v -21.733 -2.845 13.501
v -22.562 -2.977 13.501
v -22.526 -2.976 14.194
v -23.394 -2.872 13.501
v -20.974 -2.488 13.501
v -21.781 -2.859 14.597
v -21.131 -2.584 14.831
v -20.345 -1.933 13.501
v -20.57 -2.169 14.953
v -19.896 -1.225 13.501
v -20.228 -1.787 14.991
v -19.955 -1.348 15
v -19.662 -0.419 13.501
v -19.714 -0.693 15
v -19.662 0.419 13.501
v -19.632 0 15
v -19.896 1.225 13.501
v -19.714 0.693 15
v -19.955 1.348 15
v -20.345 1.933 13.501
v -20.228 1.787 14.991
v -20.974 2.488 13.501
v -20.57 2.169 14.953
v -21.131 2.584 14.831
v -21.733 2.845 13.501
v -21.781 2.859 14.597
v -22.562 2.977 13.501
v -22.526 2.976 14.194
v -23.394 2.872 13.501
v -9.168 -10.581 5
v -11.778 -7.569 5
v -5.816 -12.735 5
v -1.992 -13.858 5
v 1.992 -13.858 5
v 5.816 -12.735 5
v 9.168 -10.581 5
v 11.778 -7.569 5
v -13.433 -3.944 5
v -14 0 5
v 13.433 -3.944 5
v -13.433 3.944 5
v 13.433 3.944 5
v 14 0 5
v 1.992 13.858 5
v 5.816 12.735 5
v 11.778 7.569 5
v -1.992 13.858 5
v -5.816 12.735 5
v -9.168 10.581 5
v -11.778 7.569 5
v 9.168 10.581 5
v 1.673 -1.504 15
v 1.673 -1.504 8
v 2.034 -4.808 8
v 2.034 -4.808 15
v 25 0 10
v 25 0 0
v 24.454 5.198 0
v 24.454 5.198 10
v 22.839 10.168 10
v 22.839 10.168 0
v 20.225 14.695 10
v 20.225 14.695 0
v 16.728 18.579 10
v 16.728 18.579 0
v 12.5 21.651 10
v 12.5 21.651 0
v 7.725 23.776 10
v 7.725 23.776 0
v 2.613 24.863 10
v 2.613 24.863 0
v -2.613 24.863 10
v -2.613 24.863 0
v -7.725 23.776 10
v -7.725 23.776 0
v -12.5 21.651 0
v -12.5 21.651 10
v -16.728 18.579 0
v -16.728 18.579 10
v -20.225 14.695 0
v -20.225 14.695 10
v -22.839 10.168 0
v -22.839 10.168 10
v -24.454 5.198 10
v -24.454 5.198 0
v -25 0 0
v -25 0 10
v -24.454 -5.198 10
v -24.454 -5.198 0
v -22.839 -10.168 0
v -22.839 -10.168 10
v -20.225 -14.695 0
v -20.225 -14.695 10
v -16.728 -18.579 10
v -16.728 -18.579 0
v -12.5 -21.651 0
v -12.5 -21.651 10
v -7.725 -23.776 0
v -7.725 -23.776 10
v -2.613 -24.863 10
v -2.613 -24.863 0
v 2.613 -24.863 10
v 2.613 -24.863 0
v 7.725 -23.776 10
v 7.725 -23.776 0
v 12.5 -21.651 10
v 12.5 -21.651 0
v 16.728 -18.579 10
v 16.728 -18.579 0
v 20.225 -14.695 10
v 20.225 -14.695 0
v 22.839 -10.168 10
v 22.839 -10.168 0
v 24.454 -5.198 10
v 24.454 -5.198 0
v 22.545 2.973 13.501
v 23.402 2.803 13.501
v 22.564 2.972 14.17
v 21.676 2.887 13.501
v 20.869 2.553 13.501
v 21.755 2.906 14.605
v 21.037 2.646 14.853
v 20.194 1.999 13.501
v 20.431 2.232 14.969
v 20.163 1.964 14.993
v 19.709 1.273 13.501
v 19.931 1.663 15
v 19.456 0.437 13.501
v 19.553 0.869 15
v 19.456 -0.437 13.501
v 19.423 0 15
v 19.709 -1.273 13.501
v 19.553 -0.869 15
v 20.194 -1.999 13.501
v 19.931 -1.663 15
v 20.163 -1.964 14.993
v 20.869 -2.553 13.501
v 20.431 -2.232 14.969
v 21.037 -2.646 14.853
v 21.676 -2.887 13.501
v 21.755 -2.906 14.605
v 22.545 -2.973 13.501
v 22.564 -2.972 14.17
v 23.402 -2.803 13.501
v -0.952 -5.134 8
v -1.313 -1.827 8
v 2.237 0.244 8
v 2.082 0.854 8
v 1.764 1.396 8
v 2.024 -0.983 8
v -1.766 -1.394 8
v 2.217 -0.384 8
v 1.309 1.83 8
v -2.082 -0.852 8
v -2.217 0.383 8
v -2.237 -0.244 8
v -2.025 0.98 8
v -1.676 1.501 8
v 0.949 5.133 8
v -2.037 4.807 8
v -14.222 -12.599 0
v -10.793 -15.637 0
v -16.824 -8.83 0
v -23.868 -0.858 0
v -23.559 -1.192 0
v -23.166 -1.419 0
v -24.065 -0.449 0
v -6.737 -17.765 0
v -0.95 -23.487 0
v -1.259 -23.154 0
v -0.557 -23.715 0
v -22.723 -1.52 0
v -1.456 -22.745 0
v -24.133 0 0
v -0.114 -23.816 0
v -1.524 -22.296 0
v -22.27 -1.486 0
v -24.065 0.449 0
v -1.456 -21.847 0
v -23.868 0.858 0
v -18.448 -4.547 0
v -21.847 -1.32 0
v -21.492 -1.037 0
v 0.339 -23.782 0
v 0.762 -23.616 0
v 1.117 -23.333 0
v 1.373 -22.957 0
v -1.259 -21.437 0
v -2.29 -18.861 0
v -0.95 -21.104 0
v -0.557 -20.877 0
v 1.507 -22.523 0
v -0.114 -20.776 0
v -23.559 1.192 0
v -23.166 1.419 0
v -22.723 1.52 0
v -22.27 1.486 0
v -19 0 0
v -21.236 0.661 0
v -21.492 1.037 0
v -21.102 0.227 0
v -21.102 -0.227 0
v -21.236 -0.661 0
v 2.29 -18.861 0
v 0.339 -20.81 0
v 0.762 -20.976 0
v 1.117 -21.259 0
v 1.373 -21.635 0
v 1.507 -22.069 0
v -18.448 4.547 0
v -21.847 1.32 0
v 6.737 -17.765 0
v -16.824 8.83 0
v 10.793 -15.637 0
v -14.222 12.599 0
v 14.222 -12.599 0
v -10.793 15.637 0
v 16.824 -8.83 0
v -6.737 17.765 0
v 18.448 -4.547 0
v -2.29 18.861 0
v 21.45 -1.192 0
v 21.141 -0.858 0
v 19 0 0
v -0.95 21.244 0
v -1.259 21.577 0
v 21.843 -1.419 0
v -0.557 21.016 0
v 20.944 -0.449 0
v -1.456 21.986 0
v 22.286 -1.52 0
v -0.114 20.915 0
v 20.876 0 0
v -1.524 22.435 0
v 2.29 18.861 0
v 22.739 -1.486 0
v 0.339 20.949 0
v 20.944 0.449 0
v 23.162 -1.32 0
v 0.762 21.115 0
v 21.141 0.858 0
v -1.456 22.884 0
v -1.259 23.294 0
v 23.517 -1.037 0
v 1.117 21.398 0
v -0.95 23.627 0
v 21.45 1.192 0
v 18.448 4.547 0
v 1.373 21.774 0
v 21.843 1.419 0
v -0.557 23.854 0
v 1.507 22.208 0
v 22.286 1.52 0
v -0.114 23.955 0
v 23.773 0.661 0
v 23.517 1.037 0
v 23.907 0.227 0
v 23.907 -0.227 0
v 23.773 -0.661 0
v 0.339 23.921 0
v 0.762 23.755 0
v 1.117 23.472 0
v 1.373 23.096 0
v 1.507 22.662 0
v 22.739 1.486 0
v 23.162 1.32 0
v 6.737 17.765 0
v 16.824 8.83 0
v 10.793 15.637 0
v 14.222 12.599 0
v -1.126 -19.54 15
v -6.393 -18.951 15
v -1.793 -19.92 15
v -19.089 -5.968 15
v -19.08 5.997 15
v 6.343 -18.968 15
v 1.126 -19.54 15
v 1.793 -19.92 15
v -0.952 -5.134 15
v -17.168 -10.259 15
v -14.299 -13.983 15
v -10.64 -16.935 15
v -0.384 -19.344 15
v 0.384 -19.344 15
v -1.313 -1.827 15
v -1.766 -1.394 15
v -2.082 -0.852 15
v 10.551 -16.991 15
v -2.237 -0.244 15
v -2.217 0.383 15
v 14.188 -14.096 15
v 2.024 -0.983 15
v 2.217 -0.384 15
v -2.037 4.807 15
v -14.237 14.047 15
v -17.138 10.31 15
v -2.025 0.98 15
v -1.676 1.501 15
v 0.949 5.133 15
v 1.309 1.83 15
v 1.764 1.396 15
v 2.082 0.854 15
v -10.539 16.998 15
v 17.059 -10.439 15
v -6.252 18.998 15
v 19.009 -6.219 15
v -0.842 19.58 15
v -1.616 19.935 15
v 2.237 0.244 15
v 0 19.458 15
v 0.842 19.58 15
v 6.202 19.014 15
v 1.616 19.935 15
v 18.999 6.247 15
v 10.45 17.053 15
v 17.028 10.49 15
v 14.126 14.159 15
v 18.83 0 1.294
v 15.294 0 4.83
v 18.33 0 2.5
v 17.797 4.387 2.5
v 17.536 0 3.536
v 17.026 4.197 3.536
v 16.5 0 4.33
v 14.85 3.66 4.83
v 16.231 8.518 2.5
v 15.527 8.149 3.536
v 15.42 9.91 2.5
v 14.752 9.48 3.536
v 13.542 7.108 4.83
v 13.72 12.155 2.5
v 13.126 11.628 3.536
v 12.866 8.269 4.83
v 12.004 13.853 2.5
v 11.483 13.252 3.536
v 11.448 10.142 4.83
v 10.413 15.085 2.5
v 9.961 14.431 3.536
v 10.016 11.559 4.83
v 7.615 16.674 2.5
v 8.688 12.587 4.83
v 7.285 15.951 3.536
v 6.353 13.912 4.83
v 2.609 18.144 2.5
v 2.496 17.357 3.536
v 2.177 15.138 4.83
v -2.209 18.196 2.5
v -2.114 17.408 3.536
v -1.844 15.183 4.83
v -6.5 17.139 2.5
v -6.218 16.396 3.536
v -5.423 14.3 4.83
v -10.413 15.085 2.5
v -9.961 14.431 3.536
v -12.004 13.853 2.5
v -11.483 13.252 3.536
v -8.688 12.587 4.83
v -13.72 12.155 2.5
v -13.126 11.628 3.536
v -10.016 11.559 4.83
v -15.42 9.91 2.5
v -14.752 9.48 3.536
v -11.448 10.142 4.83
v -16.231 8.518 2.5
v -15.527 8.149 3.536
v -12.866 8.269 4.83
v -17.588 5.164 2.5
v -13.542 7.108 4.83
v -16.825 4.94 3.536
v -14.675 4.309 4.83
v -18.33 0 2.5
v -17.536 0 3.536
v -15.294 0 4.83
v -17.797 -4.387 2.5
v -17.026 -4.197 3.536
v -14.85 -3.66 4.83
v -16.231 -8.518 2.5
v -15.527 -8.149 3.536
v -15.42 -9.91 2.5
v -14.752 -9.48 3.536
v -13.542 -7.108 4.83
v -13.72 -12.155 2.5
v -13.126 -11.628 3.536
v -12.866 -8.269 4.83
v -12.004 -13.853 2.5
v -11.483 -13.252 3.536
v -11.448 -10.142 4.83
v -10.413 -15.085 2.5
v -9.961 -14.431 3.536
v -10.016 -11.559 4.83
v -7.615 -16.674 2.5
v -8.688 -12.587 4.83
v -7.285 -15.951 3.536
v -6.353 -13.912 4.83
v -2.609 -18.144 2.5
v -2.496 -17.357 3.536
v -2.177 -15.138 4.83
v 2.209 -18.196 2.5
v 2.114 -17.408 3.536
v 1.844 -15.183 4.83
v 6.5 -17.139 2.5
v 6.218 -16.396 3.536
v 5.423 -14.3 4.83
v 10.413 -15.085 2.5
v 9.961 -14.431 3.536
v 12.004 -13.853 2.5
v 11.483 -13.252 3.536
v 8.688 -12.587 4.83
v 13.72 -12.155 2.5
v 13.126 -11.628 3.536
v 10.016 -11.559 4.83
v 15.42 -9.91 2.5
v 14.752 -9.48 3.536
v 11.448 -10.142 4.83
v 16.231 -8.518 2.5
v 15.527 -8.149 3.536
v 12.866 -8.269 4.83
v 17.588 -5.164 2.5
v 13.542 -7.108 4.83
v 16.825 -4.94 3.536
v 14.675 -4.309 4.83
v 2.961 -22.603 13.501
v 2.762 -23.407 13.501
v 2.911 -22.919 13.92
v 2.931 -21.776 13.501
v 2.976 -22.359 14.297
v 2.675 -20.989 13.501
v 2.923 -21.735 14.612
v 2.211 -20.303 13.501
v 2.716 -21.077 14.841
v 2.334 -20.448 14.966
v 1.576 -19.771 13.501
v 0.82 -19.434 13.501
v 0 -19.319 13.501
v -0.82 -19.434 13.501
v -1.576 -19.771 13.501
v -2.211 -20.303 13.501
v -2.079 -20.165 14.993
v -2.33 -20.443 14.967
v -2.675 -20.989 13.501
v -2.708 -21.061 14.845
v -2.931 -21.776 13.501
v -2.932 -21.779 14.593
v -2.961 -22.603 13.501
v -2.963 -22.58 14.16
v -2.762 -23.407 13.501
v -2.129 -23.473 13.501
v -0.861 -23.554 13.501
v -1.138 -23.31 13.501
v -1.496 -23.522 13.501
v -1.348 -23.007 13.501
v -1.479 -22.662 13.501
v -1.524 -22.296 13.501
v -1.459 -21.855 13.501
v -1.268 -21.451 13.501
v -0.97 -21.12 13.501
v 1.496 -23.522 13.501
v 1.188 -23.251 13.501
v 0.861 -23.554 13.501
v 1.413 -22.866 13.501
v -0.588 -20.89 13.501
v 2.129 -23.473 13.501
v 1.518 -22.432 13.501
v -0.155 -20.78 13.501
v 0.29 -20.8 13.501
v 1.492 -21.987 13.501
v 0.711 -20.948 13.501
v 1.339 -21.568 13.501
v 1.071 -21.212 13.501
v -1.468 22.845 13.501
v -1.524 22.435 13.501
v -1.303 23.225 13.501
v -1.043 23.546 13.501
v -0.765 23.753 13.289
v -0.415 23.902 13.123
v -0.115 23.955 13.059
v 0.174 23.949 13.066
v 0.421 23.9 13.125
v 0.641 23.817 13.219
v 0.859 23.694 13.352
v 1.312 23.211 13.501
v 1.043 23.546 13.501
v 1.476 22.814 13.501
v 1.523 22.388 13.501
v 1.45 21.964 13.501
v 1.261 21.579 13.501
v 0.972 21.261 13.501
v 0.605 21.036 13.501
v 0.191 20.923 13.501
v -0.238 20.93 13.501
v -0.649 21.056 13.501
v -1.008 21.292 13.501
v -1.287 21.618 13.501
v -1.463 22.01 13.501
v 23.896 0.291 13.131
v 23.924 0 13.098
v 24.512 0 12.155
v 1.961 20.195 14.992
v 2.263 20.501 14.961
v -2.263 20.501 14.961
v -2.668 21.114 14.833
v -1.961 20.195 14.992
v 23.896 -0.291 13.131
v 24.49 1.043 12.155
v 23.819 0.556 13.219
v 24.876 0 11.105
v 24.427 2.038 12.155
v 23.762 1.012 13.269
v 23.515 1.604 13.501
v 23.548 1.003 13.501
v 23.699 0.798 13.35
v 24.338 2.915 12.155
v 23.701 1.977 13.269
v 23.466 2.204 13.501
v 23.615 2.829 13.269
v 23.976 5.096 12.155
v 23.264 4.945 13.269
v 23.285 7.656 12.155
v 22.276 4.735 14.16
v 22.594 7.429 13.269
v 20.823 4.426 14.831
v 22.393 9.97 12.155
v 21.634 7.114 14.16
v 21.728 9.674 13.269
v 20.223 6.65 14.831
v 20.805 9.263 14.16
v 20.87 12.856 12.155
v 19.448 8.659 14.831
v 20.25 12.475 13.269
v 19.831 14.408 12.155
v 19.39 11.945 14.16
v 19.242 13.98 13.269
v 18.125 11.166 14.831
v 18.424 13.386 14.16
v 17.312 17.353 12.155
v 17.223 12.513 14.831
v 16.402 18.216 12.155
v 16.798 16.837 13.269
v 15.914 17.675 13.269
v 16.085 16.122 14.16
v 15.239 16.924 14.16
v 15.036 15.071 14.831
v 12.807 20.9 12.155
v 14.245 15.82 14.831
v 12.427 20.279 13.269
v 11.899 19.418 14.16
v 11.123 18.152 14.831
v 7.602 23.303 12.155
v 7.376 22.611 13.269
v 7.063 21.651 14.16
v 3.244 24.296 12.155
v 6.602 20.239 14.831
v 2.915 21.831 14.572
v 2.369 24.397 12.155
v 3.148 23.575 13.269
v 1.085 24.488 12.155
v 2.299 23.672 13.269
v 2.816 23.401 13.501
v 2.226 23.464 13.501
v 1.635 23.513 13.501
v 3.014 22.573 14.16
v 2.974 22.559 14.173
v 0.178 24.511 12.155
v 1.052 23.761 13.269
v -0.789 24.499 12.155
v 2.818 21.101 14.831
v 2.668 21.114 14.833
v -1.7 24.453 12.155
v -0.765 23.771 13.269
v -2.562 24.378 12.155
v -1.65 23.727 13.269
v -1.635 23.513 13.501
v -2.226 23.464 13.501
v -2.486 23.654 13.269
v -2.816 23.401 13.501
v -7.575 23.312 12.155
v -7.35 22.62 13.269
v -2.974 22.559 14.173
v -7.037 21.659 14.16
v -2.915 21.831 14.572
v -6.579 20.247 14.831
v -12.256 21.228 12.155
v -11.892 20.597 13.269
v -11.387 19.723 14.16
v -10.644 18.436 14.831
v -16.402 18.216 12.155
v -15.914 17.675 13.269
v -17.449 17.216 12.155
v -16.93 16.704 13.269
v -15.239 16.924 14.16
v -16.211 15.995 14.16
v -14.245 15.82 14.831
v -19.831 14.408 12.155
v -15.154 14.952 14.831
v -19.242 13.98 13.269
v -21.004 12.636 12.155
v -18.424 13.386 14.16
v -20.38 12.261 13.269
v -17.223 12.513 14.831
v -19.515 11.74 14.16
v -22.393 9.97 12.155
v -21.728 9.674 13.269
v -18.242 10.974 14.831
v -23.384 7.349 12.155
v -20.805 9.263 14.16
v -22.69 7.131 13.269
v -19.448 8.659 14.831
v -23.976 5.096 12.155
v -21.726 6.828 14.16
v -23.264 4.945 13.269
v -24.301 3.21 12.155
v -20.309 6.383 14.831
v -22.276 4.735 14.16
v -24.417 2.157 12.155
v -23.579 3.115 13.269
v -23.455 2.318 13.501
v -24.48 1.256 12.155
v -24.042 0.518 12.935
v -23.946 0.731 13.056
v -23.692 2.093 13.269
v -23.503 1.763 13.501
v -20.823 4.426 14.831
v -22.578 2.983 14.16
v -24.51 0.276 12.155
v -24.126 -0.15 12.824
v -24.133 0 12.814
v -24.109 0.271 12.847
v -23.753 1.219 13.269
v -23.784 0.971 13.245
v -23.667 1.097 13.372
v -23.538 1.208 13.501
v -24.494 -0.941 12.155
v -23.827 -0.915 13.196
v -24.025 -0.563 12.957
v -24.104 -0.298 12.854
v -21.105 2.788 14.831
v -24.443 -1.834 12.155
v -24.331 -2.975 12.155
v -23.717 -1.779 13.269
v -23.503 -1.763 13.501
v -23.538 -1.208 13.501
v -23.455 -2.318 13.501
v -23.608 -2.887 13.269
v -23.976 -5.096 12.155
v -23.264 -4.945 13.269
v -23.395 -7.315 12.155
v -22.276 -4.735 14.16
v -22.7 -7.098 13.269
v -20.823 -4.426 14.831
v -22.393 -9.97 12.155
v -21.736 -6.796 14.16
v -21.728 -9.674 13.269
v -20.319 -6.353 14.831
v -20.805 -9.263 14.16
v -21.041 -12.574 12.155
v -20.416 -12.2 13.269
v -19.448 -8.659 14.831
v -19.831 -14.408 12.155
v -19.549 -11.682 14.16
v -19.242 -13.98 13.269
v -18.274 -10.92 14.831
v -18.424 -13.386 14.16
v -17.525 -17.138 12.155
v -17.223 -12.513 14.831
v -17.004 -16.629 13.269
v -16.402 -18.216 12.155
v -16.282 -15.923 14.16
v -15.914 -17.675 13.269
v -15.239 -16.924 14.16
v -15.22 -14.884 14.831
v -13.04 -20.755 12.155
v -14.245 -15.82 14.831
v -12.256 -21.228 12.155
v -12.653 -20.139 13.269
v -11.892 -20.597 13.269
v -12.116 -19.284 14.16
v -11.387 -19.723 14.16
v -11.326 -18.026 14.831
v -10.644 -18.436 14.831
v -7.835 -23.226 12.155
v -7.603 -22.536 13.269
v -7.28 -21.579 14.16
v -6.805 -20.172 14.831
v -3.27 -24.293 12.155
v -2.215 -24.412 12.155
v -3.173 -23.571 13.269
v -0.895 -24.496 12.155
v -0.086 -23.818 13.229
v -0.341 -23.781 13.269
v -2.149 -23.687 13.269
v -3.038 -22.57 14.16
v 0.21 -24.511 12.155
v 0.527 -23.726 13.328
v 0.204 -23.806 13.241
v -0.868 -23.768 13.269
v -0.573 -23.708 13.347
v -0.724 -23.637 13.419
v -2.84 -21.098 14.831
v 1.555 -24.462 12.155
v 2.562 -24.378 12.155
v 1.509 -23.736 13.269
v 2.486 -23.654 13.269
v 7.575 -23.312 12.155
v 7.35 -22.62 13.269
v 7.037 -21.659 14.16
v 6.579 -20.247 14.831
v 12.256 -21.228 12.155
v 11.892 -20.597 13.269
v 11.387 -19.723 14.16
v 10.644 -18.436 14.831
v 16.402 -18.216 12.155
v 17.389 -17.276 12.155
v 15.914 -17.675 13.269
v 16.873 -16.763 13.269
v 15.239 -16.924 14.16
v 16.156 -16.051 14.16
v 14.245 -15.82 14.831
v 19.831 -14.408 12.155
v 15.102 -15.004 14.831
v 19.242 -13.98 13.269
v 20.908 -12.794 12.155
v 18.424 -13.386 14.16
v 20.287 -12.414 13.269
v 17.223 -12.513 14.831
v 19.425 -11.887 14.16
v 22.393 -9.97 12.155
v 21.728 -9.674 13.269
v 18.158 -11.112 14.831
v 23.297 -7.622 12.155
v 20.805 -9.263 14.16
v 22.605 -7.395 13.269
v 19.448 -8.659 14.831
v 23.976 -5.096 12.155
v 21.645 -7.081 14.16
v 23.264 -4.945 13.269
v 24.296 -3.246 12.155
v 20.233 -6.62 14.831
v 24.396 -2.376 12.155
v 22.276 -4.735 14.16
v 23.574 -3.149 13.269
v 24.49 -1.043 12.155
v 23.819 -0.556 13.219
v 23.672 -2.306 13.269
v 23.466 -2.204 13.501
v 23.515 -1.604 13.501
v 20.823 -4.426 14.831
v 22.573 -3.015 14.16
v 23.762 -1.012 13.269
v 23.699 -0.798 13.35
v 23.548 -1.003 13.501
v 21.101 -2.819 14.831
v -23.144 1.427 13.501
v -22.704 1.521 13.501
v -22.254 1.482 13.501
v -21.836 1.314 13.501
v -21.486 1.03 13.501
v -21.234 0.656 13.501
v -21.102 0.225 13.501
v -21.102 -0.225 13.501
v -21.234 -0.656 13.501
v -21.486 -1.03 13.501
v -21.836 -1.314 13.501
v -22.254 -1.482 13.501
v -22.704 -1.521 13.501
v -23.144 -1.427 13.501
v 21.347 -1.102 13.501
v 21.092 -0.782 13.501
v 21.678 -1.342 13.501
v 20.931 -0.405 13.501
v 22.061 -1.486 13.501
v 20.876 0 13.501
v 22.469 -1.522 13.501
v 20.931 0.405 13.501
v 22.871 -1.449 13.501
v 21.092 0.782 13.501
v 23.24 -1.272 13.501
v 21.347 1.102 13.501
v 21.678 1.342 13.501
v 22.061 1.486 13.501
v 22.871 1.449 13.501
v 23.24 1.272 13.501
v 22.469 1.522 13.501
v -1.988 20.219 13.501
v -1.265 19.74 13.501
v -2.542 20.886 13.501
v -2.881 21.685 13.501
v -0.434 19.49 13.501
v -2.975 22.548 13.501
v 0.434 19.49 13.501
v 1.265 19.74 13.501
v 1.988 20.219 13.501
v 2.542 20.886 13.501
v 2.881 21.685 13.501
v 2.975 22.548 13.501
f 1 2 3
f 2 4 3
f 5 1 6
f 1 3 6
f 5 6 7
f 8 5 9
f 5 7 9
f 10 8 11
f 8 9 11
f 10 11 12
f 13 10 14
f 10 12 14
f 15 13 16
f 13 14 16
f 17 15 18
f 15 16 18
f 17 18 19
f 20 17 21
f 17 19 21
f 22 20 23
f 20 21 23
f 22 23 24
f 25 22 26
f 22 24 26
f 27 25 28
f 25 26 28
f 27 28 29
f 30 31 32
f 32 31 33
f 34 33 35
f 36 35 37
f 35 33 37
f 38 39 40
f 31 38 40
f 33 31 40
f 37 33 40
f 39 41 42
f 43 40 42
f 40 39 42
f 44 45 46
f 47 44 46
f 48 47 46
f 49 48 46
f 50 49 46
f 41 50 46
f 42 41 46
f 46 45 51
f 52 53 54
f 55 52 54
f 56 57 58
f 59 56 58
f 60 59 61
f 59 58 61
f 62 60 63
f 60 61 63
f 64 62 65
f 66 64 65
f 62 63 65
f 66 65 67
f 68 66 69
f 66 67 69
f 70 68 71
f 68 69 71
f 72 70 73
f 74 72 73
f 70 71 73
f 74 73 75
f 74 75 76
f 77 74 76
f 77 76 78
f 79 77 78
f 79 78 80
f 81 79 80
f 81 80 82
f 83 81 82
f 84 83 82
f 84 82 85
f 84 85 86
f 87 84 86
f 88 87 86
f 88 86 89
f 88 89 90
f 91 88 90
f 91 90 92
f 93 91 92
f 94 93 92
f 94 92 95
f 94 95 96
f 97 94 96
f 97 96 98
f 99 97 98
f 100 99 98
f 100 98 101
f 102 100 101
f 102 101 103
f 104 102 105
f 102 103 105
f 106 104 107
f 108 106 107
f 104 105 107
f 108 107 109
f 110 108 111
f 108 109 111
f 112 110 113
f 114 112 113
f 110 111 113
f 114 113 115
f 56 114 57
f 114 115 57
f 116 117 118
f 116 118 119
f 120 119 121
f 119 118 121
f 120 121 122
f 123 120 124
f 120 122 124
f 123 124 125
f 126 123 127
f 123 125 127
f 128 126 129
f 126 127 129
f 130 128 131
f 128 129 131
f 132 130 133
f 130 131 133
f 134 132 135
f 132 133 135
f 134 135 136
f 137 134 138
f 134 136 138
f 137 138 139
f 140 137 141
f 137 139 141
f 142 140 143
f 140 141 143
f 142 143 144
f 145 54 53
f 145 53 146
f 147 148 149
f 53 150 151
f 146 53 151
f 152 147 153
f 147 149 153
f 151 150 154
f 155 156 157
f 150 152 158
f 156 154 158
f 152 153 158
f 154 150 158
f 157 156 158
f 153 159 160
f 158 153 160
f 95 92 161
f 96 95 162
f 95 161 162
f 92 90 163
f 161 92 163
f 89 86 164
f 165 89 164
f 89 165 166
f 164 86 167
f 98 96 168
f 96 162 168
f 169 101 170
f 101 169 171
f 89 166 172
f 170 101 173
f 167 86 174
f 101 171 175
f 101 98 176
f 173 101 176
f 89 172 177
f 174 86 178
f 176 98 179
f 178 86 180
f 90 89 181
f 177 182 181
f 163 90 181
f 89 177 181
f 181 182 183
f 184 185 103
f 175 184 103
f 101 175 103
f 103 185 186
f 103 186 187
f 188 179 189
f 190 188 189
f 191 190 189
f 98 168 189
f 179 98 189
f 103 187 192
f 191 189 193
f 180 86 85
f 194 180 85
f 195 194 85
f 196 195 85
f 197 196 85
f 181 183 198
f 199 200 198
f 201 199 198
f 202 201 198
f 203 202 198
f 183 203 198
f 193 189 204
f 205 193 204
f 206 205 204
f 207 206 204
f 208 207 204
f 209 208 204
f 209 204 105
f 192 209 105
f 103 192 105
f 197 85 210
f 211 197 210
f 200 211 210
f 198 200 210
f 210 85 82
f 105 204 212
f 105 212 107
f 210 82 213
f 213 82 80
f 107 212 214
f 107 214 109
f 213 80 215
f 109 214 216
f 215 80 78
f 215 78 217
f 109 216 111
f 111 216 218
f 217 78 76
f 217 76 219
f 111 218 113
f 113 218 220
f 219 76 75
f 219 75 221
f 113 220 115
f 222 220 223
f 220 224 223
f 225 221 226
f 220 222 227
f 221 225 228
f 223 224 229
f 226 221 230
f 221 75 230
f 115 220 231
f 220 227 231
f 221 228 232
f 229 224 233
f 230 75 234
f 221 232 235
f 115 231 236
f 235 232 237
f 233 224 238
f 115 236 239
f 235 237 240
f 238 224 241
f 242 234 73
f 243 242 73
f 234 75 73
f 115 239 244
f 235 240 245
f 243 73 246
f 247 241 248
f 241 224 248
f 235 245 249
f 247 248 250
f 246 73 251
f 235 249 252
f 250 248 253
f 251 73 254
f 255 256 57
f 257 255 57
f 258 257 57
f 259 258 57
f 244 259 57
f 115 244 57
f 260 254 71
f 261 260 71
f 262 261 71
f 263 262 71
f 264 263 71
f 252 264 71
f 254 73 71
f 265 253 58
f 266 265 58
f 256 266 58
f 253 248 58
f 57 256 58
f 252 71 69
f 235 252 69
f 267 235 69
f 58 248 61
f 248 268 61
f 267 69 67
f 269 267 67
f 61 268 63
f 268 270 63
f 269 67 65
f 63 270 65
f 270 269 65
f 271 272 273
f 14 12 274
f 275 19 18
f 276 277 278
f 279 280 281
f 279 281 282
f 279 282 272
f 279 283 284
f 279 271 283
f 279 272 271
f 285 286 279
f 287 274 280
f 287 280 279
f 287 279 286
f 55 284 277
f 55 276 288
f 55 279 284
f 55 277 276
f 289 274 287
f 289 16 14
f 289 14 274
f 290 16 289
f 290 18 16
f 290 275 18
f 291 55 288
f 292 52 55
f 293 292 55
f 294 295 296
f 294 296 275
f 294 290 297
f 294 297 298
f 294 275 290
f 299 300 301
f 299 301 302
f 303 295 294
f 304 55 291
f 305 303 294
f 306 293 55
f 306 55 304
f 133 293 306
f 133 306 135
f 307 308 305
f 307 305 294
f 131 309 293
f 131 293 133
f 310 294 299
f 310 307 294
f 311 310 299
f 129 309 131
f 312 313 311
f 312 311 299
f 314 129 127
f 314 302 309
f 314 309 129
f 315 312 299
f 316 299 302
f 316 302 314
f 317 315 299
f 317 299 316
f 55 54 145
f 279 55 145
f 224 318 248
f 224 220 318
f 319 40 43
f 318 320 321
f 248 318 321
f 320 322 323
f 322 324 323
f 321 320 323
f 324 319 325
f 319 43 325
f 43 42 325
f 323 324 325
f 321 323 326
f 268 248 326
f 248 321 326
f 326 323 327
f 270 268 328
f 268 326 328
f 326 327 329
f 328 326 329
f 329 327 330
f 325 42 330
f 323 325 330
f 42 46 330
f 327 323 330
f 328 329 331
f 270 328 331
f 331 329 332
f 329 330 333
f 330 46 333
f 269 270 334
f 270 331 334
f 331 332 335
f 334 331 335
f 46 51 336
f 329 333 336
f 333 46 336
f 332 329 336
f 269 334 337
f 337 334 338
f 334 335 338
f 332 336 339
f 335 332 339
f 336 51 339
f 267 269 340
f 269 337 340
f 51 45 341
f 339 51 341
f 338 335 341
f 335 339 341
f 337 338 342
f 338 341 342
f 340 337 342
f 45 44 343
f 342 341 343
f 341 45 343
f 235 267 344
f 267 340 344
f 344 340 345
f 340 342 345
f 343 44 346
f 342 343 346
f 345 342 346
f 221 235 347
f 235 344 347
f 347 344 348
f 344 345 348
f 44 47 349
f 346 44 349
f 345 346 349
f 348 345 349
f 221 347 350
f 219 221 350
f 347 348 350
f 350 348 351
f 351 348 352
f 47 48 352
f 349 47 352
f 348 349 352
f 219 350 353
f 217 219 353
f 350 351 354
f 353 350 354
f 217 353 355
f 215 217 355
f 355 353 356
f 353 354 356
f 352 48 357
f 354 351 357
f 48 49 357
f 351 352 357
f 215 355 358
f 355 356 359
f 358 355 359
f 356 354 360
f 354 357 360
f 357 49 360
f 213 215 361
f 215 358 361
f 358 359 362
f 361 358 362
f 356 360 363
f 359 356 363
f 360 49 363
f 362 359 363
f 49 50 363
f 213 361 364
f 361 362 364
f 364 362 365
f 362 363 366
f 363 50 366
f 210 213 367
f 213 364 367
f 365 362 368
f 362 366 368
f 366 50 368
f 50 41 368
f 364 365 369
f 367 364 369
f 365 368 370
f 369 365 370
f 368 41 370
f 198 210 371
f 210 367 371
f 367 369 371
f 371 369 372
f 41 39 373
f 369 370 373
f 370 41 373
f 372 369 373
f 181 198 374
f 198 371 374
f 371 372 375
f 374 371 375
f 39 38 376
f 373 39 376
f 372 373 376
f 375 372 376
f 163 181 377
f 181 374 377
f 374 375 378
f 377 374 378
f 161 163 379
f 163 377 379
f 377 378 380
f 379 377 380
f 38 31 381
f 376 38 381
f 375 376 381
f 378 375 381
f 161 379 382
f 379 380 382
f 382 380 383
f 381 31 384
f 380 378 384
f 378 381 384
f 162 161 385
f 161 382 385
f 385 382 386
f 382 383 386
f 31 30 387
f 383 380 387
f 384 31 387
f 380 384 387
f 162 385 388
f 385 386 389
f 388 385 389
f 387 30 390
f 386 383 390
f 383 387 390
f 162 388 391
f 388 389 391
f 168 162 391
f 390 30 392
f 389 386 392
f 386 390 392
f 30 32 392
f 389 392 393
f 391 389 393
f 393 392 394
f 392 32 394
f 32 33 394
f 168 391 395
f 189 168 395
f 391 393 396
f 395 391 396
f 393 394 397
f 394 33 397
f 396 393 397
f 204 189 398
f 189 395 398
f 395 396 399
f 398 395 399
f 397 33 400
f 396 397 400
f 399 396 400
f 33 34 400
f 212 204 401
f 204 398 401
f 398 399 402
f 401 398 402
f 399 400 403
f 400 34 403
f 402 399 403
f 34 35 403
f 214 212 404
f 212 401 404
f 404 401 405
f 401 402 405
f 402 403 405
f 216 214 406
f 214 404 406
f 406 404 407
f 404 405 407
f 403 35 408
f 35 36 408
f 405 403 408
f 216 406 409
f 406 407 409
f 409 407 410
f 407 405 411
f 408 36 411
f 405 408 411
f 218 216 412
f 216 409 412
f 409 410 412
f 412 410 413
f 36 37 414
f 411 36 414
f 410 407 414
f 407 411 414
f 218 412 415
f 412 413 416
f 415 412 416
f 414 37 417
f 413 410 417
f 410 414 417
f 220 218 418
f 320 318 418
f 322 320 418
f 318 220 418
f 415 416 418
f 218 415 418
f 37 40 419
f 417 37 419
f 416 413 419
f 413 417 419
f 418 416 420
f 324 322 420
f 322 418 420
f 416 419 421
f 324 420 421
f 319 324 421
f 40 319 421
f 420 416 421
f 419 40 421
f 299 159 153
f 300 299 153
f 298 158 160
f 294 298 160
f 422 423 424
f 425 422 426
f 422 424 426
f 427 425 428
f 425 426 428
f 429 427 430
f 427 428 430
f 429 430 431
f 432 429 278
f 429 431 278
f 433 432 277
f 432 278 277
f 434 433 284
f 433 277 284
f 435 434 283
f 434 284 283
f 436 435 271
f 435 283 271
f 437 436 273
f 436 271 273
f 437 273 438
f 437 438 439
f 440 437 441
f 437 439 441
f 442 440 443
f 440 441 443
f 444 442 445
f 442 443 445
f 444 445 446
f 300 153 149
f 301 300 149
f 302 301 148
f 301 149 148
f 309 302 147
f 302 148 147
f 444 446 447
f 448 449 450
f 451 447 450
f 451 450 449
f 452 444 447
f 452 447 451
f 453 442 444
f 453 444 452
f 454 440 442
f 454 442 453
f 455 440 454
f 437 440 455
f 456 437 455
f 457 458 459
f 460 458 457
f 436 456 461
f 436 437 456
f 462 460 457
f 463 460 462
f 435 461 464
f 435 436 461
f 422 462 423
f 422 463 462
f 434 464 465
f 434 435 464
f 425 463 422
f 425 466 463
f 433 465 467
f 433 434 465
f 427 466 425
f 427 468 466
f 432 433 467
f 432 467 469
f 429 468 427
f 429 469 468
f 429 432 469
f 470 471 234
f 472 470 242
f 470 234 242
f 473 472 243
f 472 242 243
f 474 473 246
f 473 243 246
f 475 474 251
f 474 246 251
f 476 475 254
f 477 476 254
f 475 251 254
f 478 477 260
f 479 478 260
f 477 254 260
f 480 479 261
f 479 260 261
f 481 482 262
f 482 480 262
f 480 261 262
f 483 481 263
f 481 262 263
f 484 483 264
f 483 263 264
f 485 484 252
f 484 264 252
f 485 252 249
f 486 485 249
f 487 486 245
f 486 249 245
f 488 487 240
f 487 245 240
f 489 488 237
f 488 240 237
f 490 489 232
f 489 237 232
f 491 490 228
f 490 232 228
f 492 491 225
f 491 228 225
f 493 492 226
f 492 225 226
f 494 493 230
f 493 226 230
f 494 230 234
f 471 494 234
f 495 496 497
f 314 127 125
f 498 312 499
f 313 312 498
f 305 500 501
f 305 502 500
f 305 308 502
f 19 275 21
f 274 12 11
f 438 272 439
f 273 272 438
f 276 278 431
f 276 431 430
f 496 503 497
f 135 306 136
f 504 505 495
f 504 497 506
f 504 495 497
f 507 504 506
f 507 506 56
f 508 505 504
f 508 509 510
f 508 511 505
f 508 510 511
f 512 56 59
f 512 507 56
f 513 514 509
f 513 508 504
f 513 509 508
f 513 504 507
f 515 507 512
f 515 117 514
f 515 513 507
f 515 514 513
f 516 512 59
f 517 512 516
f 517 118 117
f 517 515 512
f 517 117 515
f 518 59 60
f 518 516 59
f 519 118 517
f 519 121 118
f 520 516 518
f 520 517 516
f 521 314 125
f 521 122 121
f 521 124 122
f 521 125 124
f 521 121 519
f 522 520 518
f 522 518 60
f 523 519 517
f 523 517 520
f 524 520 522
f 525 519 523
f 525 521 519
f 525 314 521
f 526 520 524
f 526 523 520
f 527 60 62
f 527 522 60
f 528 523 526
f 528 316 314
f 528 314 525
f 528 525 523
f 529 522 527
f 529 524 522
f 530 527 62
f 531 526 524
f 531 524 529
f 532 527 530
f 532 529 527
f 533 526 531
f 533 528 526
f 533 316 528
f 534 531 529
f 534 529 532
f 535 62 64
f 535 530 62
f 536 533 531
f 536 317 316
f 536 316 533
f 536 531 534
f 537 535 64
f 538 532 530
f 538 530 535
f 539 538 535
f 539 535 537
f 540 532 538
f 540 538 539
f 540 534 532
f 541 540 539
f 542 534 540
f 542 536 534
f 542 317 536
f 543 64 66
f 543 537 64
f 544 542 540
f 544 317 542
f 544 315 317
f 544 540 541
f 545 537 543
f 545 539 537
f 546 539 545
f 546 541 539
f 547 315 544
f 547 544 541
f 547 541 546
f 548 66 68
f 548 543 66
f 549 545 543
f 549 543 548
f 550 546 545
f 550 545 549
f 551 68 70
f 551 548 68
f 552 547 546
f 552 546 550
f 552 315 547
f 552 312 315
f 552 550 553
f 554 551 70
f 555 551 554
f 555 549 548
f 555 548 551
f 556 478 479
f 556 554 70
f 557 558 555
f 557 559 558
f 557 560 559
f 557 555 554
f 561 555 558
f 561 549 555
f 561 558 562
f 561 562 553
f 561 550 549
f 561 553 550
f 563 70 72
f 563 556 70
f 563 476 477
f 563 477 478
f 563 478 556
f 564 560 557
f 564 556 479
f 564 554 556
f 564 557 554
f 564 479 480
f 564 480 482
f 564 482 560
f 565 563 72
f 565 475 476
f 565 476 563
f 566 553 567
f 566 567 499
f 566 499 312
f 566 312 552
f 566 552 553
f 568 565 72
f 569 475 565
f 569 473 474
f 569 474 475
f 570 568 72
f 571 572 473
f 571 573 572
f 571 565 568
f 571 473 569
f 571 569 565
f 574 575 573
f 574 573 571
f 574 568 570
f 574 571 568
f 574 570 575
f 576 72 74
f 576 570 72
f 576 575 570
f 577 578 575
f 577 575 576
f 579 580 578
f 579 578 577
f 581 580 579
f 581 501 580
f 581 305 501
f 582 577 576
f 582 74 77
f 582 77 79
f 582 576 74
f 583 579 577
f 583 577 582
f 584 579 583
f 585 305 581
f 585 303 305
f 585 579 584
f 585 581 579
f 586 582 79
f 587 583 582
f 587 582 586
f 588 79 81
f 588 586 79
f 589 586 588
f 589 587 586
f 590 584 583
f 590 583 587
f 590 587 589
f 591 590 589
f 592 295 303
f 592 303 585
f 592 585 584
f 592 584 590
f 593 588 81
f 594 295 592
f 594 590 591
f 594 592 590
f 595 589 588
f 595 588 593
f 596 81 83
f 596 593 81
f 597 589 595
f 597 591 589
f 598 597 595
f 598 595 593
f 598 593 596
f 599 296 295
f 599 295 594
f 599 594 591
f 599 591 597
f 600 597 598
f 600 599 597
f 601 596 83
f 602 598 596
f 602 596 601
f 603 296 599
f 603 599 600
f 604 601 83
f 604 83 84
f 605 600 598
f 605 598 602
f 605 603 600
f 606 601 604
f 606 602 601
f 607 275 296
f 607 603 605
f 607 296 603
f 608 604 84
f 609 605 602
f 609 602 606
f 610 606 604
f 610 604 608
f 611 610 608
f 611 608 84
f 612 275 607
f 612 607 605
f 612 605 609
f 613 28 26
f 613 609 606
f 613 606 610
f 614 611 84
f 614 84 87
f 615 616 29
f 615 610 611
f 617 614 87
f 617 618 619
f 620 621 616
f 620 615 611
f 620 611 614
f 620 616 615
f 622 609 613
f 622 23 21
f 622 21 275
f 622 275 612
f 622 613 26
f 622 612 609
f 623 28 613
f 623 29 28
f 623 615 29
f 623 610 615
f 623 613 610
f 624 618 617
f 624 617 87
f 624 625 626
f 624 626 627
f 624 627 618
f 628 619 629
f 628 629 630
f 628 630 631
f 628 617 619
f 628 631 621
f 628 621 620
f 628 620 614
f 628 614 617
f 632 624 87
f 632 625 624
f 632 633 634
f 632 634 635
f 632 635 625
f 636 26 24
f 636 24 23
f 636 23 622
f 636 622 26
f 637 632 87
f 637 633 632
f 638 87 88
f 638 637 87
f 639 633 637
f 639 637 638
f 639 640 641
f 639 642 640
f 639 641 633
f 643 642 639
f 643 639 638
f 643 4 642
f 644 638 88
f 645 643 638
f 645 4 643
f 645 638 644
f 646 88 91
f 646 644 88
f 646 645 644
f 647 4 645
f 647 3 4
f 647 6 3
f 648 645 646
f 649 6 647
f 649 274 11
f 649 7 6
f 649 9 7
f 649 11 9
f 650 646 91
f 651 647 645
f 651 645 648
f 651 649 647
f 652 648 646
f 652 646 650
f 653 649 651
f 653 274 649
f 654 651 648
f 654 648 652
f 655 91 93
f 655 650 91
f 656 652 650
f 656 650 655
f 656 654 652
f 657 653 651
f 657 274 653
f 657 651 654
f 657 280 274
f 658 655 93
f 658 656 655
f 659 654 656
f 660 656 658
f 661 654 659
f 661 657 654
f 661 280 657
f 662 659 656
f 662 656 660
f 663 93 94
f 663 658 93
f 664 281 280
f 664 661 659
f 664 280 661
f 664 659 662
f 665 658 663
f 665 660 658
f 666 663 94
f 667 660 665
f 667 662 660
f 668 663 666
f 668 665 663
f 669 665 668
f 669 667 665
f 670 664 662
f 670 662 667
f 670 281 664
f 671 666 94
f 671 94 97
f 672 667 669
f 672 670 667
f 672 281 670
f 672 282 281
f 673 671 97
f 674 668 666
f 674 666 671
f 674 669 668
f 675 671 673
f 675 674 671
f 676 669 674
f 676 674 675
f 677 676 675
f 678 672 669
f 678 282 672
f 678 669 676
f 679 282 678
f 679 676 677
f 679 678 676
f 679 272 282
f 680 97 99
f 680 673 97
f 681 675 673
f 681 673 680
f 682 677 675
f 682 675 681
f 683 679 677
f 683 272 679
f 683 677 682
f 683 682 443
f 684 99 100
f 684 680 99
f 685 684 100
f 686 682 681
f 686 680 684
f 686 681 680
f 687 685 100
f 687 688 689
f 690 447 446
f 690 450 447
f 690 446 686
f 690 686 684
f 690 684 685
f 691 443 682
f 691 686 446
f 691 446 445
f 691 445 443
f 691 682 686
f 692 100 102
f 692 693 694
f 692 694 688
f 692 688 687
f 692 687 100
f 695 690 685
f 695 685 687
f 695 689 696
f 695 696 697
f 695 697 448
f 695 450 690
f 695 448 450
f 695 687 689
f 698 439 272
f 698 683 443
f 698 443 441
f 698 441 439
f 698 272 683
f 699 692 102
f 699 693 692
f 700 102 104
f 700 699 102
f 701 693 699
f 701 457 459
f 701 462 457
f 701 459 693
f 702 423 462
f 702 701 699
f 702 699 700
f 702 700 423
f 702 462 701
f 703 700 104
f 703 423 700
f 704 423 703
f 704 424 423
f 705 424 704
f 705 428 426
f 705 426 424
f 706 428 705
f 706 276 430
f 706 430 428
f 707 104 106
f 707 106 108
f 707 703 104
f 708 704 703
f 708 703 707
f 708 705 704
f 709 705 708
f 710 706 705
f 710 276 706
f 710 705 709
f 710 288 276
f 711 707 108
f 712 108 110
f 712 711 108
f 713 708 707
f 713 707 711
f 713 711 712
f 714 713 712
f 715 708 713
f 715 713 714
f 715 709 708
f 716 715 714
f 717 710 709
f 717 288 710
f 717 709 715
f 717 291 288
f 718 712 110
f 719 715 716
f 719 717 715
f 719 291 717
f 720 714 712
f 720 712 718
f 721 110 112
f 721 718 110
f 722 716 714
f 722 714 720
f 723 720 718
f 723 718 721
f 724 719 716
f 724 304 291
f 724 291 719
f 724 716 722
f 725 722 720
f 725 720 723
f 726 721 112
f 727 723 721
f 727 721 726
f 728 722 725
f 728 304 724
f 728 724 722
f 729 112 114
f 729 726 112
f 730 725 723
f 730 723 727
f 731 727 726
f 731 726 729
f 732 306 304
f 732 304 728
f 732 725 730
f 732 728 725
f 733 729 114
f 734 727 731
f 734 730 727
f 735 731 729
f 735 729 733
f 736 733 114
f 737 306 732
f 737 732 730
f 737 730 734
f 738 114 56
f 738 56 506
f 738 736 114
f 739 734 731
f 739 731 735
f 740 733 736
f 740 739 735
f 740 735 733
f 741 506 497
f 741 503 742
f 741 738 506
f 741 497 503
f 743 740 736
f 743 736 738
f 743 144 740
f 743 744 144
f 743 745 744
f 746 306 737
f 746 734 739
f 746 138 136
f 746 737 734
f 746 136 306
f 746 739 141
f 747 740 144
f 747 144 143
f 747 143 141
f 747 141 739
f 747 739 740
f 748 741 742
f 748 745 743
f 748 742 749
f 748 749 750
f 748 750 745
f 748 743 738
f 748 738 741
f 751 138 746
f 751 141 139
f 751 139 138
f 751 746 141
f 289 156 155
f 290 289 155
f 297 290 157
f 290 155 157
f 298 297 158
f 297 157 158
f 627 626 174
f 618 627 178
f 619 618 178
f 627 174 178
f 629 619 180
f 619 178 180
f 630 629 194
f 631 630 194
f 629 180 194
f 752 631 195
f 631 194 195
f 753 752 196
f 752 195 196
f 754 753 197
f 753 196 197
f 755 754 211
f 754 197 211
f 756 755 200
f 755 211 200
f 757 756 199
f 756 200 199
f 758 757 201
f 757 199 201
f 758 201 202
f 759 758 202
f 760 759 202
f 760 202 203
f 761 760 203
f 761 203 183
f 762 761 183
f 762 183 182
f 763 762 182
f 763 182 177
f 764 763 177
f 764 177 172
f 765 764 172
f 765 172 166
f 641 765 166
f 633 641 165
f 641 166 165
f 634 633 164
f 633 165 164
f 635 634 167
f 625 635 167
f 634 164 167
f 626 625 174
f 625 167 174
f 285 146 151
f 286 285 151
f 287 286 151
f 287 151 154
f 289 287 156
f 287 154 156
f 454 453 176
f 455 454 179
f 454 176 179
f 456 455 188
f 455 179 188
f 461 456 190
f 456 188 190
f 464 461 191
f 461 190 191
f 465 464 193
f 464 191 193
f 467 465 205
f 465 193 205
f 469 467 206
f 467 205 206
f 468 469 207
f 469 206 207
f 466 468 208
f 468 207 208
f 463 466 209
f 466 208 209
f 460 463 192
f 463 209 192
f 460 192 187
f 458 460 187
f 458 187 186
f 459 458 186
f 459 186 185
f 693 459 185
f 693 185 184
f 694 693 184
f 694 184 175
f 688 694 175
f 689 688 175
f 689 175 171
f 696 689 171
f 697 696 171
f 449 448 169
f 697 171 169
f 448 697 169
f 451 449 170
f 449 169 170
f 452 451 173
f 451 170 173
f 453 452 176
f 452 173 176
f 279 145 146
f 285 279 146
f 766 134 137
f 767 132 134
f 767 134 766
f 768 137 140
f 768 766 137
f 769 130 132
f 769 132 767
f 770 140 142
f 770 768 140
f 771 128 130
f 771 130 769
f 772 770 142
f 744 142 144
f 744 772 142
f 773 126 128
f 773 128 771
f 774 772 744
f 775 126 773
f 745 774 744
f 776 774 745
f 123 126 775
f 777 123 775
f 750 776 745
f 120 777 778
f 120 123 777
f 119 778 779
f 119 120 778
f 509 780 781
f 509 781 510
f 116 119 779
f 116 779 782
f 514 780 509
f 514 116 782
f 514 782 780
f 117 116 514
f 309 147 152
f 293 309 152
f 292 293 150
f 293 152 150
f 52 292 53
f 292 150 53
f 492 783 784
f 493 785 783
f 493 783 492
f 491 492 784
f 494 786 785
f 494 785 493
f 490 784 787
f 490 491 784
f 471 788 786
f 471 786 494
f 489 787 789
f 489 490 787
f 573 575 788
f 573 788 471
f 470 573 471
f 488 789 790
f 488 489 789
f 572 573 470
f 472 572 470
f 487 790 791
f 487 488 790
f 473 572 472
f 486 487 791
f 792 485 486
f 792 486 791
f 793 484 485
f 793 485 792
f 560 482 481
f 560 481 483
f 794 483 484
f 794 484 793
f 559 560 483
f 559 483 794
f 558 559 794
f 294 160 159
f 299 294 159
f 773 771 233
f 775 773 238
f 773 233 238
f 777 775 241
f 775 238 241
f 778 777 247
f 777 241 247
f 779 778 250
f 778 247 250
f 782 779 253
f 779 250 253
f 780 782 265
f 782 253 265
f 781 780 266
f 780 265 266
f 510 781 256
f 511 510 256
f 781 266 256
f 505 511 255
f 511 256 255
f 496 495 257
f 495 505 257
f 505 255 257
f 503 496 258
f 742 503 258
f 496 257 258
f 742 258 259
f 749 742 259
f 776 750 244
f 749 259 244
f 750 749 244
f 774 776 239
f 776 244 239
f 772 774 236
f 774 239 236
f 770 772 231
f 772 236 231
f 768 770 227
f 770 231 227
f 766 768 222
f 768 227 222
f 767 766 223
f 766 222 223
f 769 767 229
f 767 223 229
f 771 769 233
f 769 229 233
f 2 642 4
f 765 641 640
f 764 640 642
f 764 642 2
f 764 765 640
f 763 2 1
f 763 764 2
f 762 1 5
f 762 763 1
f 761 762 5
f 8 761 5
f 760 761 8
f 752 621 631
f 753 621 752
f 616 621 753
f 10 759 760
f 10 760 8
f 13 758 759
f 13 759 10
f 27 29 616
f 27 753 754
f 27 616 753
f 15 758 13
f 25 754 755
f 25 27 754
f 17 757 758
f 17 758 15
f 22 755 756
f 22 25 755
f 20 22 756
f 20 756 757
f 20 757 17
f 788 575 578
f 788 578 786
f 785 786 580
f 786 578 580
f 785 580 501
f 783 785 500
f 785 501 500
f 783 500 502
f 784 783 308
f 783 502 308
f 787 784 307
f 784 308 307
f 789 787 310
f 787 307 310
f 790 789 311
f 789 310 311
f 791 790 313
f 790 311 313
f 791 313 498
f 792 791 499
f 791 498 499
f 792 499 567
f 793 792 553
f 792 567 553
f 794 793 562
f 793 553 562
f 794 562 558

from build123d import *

# Parameters (mm, degrees)
SKETCH1_R                                           = 25
SKETCH1_R_2                                         = 19
BOSS_EXTRUDE1_DEPTH                                 = 5
SKETCH2_R                                           = 25
BOSS_EXTRUDE2_DEPTH                                 = 10
FILLET1_R                                           = 5
CBORE_FOR_3_BINDING_HEAD_MACHINE_SCREW1_D           = 3.048
CBORE_FOR_3_BINDING_HEAD_MACHINE_SCREW1_CBORE_D     = 5.95376
CBORE_FOR_3_BINDING_HEAD_MACHINE_SCREW1_CBORE_DEPTH = 1.4986
CUT_EXTRUDE1_START                                  = -3
CUT_EXTRUDE1_DEPTH                                  = 10


with BuildPart() as part:
    # Sketch1 → Boss-Extrude1 (new body)
    with BuildSketch(Plane.XY):
        Circle(SKETCH1_R)
        Circle(SKETCH1_R_2, mode=Mode.SUBTRACT)
    extrude(amount=BOSS_EXTRUDE1_DEPTH)

    # Sketch2 → Boss-Extrude2 (add)
    with BuildSketch(Plane.XY.offset(5)):
        Circle(SKETCH2_R)
    extrude(amount=BOSS_EXTRUDE2_DEPTH)

    # Fillet1
    fillet1_edges = [part.edges().sort_by_distance(p)[0] for p in [
        (-25, 0, 15),
        (-19, 0, 5),
    ]]
    fillet(fillet1_edges, radius=FILLET1_R - 0.0001)  # a hair under: the kernel refuses the full size

    # CBORE for #3 Binding Head Machine Screw1 (through all)
    with Locations(Plane.XY.offset(15)):
        with Locations((0, 22.435050854), (0, -22.295918756), (22.400267829, 0), (-22.608965977, 0)):
            CounterBoreHole(CBORE_FOR_3_BINDING_HEAD_MACHINE_SCREW1_D / 2, CBORE_FOR_3_BINDING_HEAD_MACHINE_SCREW1_CBORE_D / 2, CBORE_FOR_3_BINDING_HEAD_MACHINE_SCREW1_CBORE_DEPTH)

    # Sketch15 → Cut-Extrude1 (cut)
    with BuildSketch(Plane(origin=(0, 0, 5), x_dir=(-1, 0, 0), z_dir=(0, 0, -1)).offset(CUT_EXTRUDE1_START)):
        with BuildLine():
            Line((1.676226843, 1.500920907), (2.037127027, 4.807341739))
            Line((2.037127027, 4.807341739), (-0.948609283, 5.133238785))
            Line((-0.948609283, 5.133238785), (-1.309172026, 1.829909453))
            ThreePointArc((-1.309172026, 1.829909453), (-1.94216249, 1.136003901), (-2.236715327, 0.244140421))
            ThreePointArc((-2.236715327, 0.244140421), (-2.141502308, -0.690266516), (-1.673115077, -1.504388892))
            Line((-1.673115077, -1.504388892), (-2.03367782, -4.807718225))
            Line((-2.03367782, -4.807718225), (0.952058491, -5.133615271))
            Line((0.952058491, -5.133615271), (1.312958675, -1.827194439))
            ThreePointArc((1.312958675, -1.827194439), (1.943337692, -1.133992334), (2.236715327, -0.244140421))
            ThreePointArc((2.236715327, -0.244140421), (2.142215878, 0.688048787), (1.676226843, 1.500920907))
        make_face()
    extrude(amount=-CUT_EXTRUDE1_DEPTH, mode=Mode.SUBTRACT)


solid = part.part
